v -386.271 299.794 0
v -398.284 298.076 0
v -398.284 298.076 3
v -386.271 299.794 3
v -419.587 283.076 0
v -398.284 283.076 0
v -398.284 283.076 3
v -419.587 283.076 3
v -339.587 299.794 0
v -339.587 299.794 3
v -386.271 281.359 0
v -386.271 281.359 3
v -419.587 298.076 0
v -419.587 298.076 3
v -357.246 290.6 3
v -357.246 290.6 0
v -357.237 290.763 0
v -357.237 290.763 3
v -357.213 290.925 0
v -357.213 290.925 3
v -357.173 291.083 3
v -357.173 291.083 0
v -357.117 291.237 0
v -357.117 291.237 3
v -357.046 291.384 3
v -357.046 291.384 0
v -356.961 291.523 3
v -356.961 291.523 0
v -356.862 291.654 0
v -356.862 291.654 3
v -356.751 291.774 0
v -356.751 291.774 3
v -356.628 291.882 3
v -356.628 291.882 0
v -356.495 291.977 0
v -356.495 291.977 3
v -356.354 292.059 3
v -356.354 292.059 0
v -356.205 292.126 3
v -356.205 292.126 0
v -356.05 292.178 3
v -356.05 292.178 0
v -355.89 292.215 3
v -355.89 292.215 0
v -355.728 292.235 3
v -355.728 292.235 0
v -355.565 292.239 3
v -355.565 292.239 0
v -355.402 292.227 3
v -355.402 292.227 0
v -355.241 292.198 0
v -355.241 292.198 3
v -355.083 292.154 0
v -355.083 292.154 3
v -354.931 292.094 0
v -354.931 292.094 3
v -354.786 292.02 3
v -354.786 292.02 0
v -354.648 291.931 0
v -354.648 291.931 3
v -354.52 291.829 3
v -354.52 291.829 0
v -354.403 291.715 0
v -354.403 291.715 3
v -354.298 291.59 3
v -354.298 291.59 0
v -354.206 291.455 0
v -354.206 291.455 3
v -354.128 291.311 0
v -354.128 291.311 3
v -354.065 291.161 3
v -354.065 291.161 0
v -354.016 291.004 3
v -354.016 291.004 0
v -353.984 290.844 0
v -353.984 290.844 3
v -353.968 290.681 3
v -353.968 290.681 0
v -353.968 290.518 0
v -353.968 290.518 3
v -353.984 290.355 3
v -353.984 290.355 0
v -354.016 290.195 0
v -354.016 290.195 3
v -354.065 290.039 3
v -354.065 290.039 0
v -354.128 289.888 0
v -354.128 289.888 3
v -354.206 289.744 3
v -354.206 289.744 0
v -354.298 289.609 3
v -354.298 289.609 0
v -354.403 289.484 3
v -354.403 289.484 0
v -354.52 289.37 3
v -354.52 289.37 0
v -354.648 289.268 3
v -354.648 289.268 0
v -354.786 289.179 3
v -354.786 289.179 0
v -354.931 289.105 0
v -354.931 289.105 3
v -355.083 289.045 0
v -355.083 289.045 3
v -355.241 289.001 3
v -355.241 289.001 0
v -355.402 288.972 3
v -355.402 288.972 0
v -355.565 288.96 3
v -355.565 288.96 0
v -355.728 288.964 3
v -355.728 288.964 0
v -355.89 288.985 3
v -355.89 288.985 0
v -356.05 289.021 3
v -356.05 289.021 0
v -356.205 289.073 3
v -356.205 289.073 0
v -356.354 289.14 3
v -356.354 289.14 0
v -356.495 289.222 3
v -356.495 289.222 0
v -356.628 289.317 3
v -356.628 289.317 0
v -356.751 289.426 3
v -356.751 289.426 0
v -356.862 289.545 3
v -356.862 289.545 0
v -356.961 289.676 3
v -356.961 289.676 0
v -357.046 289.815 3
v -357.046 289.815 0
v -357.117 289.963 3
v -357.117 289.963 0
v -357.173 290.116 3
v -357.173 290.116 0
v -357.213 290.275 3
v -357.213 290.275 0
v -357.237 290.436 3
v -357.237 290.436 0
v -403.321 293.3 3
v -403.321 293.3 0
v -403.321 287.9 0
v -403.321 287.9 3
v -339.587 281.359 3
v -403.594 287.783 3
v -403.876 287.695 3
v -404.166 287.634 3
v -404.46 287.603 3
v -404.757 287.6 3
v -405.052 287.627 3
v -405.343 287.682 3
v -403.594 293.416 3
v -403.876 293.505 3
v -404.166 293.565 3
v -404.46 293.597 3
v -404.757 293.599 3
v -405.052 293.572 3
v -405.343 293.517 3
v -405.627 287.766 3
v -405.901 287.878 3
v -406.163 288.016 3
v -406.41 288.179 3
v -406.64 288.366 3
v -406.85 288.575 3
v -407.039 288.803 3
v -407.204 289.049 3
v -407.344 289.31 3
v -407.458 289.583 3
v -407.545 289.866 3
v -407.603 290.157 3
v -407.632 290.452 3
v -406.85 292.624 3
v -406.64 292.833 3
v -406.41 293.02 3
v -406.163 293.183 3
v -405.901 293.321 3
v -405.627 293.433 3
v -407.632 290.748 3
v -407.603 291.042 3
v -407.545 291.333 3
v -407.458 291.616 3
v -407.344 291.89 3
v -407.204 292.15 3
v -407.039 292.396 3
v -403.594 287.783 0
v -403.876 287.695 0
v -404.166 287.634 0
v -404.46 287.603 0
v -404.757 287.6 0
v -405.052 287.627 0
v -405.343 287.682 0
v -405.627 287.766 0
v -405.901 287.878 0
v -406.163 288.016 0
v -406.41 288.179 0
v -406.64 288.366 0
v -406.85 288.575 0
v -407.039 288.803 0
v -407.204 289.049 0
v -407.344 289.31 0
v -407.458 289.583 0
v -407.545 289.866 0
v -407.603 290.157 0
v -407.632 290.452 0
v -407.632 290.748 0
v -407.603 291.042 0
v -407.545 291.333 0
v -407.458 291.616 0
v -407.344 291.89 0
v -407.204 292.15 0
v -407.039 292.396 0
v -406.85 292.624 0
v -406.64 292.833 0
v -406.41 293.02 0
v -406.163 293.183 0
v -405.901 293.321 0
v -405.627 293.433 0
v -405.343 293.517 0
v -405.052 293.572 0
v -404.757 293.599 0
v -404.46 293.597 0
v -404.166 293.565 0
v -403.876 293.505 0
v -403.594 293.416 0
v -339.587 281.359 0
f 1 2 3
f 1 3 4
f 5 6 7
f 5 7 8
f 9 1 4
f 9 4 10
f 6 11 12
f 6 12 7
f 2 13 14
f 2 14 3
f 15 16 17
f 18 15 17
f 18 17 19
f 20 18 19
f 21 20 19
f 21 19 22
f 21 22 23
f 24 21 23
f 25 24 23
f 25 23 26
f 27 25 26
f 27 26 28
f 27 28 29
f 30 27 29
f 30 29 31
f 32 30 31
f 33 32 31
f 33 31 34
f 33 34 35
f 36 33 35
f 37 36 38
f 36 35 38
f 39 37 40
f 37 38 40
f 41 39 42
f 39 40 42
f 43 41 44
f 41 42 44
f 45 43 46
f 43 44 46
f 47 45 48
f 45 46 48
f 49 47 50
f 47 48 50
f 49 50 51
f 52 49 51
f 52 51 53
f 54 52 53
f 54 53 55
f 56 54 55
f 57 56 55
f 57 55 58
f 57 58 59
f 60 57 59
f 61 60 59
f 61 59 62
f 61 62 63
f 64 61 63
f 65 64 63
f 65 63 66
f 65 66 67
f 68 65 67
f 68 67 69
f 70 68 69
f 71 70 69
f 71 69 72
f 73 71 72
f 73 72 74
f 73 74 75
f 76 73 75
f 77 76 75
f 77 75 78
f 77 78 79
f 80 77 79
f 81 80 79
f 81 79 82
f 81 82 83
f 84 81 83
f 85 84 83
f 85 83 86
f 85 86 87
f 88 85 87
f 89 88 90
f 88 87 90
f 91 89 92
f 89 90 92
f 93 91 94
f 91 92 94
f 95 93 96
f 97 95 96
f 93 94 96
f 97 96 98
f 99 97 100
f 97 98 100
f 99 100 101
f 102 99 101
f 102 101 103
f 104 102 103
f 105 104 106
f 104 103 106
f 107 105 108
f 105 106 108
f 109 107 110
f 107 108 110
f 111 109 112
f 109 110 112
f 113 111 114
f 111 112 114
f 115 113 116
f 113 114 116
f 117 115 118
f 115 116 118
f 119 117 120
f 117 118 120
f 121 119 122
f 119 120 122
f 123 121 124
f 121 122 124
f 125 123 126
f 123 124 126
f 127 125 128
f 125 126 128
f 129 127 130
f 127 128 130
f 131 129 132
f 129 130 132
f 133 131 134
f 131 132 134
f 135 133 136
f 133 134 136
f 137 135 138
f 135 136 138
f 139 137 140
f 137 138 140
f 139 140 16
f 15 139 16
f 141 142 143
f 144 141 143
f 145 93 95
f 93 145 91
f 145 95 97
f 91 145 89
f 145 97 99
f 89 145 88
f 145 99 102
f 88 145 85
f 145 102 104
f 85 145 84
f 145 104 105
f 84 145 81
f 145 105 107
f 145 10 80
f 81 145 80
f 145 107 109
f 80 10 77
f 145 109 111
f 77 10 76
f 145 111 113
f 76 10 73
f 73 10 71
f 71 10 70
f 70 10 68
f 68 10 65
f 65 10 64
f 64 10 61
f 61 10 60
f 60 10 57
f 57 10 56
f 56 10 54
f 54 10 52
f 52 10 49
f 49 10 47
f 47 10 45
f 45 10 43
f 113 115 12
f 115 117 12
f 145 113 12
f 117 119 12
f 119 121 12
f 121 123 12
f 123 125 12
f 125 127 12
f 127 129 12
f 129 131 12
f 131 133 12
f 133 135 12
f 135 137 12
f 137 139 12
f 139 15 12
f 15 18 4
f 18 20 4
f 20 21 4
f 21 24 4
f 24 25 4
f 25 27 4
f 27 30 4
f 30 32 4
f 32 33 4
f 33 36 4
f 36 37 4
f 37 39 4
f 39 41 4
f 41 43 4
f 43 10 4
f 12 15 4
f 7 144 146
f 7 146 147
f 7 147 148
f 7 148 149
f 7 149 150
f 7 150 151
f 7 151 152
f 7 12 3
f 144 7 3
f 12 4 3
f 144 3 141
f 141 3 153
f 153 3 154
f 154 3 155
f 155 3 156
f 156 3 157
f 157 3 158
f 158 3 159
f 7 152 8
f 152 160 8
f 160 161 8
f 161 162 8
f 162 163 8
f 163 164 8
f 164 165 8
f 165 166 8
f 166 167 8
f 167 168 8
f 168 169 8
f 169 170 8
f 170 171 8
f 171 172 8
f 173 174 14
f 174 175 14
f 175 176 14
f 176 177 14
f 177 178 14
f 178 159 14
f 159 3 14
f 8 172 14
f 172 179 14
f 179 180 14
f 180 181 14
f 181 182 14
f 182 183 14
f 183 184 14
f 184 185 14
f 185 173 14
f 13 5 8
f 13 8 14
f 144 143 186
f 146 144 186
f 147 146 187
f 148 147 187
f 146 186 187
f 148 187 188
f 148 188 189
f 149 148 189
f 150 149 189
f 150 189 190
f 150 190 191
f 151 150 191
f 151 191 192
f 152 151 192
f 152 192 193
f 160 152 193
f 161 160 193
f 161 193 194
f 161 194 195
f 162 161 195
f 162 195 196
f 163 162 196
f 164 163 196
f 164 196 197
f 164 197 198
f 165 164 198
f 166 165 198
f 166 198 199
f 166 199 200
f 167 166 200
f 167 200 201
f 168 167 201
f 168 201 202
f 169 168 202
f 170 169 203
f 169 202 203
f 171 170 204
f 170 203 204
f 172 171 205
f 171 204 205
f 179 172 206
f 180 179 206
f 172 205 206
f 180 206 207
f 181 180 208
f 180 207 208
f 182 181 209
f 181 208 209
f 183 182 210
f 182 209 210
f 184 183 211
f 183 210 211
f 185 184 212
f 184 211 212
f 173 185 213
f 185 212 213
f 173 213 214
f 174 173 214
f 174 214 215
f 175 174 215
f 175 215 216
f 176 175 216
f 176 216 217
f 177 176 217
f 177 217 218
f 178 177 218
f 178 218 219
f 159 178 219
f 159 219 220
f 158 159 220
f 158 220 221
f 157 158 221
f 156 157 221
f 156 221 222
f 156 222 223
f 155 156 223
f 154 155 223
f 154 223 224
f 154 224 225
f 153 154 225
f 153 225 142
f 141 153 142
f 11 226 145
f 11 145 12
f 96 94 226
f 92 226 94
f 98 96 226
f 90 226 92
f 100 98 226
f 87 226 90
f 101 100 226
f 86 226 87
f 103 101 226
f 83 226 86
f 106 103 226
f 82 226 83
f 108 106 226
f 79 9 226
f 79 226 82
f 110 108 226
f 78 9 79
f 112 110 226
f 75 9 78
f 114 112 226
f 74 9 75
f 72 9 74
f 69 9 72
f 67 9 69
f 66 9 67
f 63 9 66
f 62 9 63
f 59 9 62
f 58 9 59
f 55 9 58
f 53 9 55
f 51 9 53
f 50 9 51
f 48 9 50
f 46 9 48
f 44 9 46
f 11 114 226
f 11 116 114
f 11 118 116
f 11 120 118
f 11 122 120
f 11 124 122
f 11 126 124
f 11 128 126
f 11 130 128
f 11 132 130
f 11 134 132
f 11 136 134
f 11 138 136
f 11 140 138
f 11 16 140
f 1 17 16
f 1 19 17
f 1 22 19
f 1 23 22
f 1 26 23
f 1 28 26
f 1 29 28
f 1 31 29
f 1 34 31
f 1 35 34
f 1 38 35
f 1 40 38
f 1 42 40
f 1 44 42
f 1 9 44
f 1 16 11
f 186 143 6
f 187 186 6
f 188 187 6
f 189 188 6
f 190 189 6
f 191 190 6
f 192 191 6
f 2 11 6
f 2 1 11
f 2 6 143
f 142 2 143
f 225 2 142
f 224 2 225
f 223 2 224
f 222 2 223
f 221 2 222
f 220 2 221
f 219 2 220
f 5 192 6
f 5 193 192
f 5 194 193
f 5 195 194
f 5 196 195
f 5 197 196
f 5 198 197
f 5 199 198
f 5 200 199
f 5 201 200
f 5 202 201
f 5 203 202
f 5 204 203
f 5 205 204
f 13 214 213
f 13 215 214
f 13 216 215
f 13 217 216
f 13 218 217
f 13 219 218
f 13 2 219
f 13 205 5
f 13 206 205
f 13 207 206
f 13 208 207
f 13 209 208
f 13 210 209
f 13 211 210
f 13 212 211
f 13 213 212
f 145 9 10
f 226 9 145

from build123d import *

# Parameters (mm, degrees)
BOSS_EXTRUDE1_DEPTH = 3
CUT_EXTRUDE3_DEPTH  = 516.692890771
SKETCH4_R           = 1.64
CUT_EXTRUDE2_DEPTH  = 516.692890771


with BuildPart() as part:
    # Sketch1 → Boss-Extrude1 (new body)
    with BuildSketch(Plane.XY):
        Polygon((-398.2841, 298.0765), (-386.271234014, 299.794262601), (-339.587365996, 299.794262601), (-339.587365996, 281.358737399), (-386.271234014, 281.358737399), (-398.2841, 283.0765), (-419.587365996, 283.0765), (-419.587365996, 298.0765), align=None)
    extrude(amount=BOSS_EXTRUDE1_DEPTH)

    # Sketch5 → Cut-Extrude3 (cut, through all)
    with BuildSketch(Plane(origin=(0, 0, 0), x_dir=(-1, 0, 0), z_dir=(0, 0, -1))):
        with BuildLine():
            Line((403.321087066, 293.299611149), (403.321087066, 287.899611149))
            ThreePointArc((403.321087066, 287.899611149), (407.635649248, 290.599611149), (403.321087066, 293.299611149))
        make_face()
    extrude(amount=-CUT_EXTRUDE3_DEPTH, mode=Mode.SUBTRACT)

    # Sketch4 → Cut-Extrude2 (cut, through all)
    with BuildSketch(Plane(origin=(0, 0, 0), x_dir=(-1, 0, 0), z_dir=(0, 0, -1))):
        with Locations((355.605649248, 290.599611149)):
            Circle(SKETCH4_R)
    extrude(amount=-CUT_EXTRUDE2_DEPTH, mode=Mode.SUBTRACT)


solid = part.part
